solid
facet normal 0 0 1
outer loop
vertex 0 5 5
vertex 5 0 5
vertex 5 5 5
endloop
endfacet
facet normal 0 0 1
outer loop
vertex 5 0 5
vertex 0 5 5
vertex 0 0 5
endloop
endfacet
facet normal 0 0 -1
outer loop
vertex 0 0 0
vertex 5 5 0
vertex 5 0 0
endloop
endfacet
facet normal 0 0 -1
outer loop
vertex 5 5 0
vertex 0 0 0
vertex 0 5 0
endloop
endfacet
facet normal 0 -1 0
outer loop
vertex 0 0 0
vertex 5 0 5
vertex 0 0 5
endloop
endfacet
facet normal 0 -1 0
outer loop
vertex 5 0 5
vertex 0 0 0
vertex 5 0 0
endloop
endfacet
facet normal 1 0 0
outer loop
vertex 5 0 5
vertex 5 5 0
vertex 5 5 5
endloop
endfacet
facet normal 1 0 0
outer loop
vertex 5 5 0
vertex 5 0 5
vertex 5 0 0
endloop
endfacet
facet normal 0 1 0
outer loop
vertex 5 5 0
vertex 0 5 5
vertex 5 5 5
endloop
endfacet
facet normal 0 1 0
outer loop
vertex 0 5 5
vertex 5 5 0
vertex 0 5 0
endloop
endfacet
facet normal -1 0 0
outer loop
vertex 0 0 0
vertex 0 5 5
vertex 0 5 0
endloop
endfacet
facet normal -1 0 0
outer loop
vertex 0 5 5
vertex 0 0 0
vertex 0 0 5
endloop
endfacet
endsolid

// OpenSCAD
//surface(file ="plan-2.png", center = true, convexity = 10);

//surface(file="surface.dat",center=true);

//surface(file="test_surface.dat",center=true);

//surface(surface(file="plan-3.png",center=true);file="plan-3.png",center=true);

//surface(file="plan-4.raw",center=true);

//color("red")
	linear_extrude(height = 5, center = true, convexity = 10)
		import(file = "plan-5.dxf");

cube([5,5,5]);
